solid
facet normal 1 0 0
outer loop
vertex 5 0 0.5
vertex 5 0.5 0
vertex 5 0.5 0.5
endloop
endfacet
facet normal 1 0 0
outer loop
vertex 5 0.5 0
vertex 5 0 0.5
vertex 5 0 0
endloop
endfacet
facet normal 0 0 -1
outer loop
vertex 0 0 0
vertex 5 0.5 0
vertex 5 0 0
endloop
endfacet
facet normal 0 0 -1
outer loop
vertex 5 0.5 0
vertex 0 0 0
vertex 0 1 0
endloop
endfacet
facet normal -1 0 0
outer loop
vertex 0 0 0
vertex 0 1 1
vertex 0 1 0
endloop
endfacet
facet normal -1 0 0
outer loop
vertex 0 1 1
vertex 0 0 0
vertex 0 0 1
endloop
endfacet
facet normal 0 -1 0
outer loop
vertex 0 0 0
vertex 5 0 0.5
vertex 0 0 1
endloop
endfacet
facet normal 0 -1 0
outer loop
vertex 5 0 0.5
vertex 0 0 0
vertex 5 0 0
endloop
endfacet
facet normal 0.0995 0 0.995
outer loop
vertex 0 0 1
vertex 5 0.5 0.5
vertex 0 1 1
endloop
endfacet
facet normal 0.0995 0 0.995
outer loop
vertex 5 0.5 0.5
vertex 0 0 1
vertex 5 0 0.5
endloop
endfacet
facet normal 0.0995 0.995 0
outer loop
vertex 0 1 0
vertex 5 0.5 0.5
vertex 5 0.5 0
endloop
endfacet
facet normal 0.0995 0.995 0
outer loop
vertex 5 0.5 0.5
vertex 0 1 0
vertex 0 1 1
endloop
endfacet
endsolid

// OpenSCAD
//######################################################################
// double_taper_spar.scad - creates a spar tapered on two sides
// (c) 2021 - Roie R. Black
// docs: https://rblack.github.io/math-magik/magik/double_taper_spar.html

module double_taper_spar(l=5, y1=1, y2=0.5, z1=1, z2=0.5, debug=false) {
  // calc taper angles
  yang = atan2(z1-z2,l);
  zang = atan2(y1-y2,l);


  difference() {
    // z taper
    difference() {
      cube([l,y1,z1]);
      translate([0,-y1/2, z1])
        rotate([0,yang,0])
          if (debug) {
            #cube([l+1, 2*y1, z1]);
          } else {
            cube([l+1, 2*y1, z1]);
          }
    // y taper
    translate([0,y1, -z1/2])
      rotate([0,0,-zang])
        if (debug) {
          #cube([l+1, y1, 2*z1]);
        } else {
          cube([l+1, y1, 2*z1]);
        }
    }
  }
}

double_taper_spar();
